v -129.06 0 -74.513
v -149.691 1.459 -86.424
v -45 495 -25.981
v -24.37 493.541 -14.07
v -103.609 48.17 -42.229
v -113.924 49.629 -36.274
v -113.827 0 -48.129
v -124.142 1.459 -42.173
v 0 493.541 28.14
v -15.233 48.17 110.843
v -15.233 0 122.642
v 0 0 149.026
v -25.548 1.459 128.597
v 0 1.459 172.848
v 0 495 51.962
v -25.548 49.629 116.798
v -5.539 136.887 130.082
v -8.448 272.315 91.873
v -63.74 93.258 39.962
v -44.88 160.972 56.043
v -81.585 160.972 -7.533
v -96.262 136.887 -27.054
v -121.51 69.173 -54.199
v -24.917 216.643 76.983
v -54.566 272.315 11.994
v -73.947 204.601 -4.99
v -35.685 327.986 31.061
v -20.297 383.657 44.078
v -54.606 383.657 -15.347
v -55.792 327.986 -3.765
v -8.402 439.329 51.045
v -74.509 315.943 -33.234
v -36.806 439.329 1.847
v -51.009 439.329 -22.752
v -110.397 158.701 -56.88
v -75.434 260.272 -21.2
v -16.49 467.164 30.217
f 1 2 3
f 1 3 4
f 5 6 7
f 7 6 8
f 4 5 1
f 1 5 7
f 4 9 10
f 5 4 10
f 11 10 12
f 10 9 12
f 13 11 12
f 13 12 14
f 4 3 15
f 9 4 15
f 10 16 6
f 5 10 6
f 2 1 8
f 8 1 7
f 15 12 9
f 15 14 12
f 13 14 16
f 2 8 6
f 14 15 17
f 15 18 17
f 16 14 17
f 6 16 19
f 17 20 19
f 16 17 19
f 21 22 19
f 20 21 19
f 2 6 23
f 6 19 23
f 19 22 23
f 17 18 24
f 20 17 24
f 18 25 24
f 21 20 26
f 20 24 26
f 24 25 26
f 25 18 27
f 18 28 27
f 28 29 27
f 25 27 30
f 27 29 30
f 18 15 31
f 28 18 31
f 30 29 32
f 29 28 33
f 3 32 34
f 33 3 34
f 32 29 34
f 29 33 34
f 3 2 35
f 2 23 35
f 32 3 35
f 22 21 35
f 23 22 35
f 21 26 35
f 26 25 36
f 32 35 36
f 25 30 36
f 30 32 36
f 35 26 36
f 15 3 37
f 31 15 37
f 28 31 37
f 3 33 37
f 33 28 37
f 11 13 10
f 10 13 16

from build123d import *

# Parameters (mm, degrees)
F7_R      = 342.018490112
F8_DEPTH  = 245.8819093468
F10_DEPTH = 134.9414547473
F11_W     = 62.9695011303
F11_H     = 407.8883975744
F12_DEPTH = 201.1136668937
F13_W     = 28.0343884617
F13_H     = 90
F14_DEPTH = 134.9414547473
F17_R     = 326.8037902675
F18_DEPTH = 78.4909831788
F20_R     = 344.6516886149
F21_DEPTH = 6.9809661843


with BuildPart() as f5:
    # F1 (on Front) → F5 section 0
    with BuildSketch(Plane.XZ):
        Polygon((-150, -86.6025403784), (150, -86.6025403784), (0, 173.2050807569), align=None)
    # F4 (on line) → F5 section 1
    with BuildSketch(Plane(origin=(0, 495, 0), x_dir=(-1, 0, 0), z_dir=(0, 1, 0))):
        Polygon((-45, -25.9807621135), (45, -25.9807621135), (0, 51.9615242271), align=None)
    loft()

    # F7 (on face) → F8 (cut, through all)
    with BuildSketch(Plane(origin=(-63.5765006646, 8.9906162556, 36.7059097728), x_dir=(-0.1052740693, -0.9925840823, 0.0607800123), z_dir=(-0.8596030307, 0.1215600245, 0.4962920411))):
        with Locations((-271.4140117168, 0)):
            Circle(F7_R)
    extrude(amount=-F8_DEPTH, mode=Mode.SUBTRACT)

    # F9 (on face) → F10 (cut, through all)
    with BuildSketch(Plane(origin=(-73.8917370326, 10.4493365501, 42.6614142666), x_dir=(-0.1052740693, -0.9925840823, 0.0607800123), z_dir=(-0.8596030307, 0.1215600245, 0.4962920411))):
        Polygon((-39.4725930665, -88.3763476395), (10.5274069335, -98.9037545729), (10.5274069335, 98.9037545729), (-39.4725930665, 88.3763476395), align=None)
    extrude(amount=-F10_DEPTH, mode=Mode.SUBTRACT)

    # F11 (on face) → F12 (cut, through all)
    with BuildSketch(Plane(origin=(-63.5765006646, 8.9906162556, 36.7059097728), x_dir=(0.1052740693, 0.9925840823, -0.0607800123), z_dir=(0.8596030307, -0.1215600245, -0.4962920411))):
        with Locations((-40.5425386316, -31.164906919)):
            Rectangle(F11_W, F11_H)
    extrude(amount=-F12_DEPTH, mode=Mode.SUBTRACT)

    # F13 (on face) → F14 (cut, through all)
    with BuildSketch(Plane(origin=(-73.8917370326, 10.4493365501, 42.6614142666), x_dir=(-0.1052740693, -0.9925840823, 0.0607800123), z_dir=(-0.8596030307, 0.1215600245, 0.4962920411))):
        with Locations((-502.1880928891, 0)):
            Rectangle(F13_W, F13_H)
    extrude(amount=-F14_DEPTH, mode=Mode.SUBTRACT)

    # F17 (on face) → F18 (cut, through all)
    with BuildSketch(Plane(origin=(0, 0, 0), x_dir=(0.8660254038, 0, 0.5), z_dir=(0.5, 0, -0.8660254038))):
        with Locations((-73.8831460476, -254.315674305)):
            Circle(F17_R)
    extrude(amount=F18_DEPTH, mode=Mode.SUBTRACT)

    # F20 (on face) → F21 (cut, through all)
    with BuildSketch(Plane.YZ):
        with Locations((244.284003973, 80.6711390615)):
            Circle(F20_R)
    extrude(amount=F21_DEPTH, mode=Mode.SUBTRACT)


solid = f5.part
